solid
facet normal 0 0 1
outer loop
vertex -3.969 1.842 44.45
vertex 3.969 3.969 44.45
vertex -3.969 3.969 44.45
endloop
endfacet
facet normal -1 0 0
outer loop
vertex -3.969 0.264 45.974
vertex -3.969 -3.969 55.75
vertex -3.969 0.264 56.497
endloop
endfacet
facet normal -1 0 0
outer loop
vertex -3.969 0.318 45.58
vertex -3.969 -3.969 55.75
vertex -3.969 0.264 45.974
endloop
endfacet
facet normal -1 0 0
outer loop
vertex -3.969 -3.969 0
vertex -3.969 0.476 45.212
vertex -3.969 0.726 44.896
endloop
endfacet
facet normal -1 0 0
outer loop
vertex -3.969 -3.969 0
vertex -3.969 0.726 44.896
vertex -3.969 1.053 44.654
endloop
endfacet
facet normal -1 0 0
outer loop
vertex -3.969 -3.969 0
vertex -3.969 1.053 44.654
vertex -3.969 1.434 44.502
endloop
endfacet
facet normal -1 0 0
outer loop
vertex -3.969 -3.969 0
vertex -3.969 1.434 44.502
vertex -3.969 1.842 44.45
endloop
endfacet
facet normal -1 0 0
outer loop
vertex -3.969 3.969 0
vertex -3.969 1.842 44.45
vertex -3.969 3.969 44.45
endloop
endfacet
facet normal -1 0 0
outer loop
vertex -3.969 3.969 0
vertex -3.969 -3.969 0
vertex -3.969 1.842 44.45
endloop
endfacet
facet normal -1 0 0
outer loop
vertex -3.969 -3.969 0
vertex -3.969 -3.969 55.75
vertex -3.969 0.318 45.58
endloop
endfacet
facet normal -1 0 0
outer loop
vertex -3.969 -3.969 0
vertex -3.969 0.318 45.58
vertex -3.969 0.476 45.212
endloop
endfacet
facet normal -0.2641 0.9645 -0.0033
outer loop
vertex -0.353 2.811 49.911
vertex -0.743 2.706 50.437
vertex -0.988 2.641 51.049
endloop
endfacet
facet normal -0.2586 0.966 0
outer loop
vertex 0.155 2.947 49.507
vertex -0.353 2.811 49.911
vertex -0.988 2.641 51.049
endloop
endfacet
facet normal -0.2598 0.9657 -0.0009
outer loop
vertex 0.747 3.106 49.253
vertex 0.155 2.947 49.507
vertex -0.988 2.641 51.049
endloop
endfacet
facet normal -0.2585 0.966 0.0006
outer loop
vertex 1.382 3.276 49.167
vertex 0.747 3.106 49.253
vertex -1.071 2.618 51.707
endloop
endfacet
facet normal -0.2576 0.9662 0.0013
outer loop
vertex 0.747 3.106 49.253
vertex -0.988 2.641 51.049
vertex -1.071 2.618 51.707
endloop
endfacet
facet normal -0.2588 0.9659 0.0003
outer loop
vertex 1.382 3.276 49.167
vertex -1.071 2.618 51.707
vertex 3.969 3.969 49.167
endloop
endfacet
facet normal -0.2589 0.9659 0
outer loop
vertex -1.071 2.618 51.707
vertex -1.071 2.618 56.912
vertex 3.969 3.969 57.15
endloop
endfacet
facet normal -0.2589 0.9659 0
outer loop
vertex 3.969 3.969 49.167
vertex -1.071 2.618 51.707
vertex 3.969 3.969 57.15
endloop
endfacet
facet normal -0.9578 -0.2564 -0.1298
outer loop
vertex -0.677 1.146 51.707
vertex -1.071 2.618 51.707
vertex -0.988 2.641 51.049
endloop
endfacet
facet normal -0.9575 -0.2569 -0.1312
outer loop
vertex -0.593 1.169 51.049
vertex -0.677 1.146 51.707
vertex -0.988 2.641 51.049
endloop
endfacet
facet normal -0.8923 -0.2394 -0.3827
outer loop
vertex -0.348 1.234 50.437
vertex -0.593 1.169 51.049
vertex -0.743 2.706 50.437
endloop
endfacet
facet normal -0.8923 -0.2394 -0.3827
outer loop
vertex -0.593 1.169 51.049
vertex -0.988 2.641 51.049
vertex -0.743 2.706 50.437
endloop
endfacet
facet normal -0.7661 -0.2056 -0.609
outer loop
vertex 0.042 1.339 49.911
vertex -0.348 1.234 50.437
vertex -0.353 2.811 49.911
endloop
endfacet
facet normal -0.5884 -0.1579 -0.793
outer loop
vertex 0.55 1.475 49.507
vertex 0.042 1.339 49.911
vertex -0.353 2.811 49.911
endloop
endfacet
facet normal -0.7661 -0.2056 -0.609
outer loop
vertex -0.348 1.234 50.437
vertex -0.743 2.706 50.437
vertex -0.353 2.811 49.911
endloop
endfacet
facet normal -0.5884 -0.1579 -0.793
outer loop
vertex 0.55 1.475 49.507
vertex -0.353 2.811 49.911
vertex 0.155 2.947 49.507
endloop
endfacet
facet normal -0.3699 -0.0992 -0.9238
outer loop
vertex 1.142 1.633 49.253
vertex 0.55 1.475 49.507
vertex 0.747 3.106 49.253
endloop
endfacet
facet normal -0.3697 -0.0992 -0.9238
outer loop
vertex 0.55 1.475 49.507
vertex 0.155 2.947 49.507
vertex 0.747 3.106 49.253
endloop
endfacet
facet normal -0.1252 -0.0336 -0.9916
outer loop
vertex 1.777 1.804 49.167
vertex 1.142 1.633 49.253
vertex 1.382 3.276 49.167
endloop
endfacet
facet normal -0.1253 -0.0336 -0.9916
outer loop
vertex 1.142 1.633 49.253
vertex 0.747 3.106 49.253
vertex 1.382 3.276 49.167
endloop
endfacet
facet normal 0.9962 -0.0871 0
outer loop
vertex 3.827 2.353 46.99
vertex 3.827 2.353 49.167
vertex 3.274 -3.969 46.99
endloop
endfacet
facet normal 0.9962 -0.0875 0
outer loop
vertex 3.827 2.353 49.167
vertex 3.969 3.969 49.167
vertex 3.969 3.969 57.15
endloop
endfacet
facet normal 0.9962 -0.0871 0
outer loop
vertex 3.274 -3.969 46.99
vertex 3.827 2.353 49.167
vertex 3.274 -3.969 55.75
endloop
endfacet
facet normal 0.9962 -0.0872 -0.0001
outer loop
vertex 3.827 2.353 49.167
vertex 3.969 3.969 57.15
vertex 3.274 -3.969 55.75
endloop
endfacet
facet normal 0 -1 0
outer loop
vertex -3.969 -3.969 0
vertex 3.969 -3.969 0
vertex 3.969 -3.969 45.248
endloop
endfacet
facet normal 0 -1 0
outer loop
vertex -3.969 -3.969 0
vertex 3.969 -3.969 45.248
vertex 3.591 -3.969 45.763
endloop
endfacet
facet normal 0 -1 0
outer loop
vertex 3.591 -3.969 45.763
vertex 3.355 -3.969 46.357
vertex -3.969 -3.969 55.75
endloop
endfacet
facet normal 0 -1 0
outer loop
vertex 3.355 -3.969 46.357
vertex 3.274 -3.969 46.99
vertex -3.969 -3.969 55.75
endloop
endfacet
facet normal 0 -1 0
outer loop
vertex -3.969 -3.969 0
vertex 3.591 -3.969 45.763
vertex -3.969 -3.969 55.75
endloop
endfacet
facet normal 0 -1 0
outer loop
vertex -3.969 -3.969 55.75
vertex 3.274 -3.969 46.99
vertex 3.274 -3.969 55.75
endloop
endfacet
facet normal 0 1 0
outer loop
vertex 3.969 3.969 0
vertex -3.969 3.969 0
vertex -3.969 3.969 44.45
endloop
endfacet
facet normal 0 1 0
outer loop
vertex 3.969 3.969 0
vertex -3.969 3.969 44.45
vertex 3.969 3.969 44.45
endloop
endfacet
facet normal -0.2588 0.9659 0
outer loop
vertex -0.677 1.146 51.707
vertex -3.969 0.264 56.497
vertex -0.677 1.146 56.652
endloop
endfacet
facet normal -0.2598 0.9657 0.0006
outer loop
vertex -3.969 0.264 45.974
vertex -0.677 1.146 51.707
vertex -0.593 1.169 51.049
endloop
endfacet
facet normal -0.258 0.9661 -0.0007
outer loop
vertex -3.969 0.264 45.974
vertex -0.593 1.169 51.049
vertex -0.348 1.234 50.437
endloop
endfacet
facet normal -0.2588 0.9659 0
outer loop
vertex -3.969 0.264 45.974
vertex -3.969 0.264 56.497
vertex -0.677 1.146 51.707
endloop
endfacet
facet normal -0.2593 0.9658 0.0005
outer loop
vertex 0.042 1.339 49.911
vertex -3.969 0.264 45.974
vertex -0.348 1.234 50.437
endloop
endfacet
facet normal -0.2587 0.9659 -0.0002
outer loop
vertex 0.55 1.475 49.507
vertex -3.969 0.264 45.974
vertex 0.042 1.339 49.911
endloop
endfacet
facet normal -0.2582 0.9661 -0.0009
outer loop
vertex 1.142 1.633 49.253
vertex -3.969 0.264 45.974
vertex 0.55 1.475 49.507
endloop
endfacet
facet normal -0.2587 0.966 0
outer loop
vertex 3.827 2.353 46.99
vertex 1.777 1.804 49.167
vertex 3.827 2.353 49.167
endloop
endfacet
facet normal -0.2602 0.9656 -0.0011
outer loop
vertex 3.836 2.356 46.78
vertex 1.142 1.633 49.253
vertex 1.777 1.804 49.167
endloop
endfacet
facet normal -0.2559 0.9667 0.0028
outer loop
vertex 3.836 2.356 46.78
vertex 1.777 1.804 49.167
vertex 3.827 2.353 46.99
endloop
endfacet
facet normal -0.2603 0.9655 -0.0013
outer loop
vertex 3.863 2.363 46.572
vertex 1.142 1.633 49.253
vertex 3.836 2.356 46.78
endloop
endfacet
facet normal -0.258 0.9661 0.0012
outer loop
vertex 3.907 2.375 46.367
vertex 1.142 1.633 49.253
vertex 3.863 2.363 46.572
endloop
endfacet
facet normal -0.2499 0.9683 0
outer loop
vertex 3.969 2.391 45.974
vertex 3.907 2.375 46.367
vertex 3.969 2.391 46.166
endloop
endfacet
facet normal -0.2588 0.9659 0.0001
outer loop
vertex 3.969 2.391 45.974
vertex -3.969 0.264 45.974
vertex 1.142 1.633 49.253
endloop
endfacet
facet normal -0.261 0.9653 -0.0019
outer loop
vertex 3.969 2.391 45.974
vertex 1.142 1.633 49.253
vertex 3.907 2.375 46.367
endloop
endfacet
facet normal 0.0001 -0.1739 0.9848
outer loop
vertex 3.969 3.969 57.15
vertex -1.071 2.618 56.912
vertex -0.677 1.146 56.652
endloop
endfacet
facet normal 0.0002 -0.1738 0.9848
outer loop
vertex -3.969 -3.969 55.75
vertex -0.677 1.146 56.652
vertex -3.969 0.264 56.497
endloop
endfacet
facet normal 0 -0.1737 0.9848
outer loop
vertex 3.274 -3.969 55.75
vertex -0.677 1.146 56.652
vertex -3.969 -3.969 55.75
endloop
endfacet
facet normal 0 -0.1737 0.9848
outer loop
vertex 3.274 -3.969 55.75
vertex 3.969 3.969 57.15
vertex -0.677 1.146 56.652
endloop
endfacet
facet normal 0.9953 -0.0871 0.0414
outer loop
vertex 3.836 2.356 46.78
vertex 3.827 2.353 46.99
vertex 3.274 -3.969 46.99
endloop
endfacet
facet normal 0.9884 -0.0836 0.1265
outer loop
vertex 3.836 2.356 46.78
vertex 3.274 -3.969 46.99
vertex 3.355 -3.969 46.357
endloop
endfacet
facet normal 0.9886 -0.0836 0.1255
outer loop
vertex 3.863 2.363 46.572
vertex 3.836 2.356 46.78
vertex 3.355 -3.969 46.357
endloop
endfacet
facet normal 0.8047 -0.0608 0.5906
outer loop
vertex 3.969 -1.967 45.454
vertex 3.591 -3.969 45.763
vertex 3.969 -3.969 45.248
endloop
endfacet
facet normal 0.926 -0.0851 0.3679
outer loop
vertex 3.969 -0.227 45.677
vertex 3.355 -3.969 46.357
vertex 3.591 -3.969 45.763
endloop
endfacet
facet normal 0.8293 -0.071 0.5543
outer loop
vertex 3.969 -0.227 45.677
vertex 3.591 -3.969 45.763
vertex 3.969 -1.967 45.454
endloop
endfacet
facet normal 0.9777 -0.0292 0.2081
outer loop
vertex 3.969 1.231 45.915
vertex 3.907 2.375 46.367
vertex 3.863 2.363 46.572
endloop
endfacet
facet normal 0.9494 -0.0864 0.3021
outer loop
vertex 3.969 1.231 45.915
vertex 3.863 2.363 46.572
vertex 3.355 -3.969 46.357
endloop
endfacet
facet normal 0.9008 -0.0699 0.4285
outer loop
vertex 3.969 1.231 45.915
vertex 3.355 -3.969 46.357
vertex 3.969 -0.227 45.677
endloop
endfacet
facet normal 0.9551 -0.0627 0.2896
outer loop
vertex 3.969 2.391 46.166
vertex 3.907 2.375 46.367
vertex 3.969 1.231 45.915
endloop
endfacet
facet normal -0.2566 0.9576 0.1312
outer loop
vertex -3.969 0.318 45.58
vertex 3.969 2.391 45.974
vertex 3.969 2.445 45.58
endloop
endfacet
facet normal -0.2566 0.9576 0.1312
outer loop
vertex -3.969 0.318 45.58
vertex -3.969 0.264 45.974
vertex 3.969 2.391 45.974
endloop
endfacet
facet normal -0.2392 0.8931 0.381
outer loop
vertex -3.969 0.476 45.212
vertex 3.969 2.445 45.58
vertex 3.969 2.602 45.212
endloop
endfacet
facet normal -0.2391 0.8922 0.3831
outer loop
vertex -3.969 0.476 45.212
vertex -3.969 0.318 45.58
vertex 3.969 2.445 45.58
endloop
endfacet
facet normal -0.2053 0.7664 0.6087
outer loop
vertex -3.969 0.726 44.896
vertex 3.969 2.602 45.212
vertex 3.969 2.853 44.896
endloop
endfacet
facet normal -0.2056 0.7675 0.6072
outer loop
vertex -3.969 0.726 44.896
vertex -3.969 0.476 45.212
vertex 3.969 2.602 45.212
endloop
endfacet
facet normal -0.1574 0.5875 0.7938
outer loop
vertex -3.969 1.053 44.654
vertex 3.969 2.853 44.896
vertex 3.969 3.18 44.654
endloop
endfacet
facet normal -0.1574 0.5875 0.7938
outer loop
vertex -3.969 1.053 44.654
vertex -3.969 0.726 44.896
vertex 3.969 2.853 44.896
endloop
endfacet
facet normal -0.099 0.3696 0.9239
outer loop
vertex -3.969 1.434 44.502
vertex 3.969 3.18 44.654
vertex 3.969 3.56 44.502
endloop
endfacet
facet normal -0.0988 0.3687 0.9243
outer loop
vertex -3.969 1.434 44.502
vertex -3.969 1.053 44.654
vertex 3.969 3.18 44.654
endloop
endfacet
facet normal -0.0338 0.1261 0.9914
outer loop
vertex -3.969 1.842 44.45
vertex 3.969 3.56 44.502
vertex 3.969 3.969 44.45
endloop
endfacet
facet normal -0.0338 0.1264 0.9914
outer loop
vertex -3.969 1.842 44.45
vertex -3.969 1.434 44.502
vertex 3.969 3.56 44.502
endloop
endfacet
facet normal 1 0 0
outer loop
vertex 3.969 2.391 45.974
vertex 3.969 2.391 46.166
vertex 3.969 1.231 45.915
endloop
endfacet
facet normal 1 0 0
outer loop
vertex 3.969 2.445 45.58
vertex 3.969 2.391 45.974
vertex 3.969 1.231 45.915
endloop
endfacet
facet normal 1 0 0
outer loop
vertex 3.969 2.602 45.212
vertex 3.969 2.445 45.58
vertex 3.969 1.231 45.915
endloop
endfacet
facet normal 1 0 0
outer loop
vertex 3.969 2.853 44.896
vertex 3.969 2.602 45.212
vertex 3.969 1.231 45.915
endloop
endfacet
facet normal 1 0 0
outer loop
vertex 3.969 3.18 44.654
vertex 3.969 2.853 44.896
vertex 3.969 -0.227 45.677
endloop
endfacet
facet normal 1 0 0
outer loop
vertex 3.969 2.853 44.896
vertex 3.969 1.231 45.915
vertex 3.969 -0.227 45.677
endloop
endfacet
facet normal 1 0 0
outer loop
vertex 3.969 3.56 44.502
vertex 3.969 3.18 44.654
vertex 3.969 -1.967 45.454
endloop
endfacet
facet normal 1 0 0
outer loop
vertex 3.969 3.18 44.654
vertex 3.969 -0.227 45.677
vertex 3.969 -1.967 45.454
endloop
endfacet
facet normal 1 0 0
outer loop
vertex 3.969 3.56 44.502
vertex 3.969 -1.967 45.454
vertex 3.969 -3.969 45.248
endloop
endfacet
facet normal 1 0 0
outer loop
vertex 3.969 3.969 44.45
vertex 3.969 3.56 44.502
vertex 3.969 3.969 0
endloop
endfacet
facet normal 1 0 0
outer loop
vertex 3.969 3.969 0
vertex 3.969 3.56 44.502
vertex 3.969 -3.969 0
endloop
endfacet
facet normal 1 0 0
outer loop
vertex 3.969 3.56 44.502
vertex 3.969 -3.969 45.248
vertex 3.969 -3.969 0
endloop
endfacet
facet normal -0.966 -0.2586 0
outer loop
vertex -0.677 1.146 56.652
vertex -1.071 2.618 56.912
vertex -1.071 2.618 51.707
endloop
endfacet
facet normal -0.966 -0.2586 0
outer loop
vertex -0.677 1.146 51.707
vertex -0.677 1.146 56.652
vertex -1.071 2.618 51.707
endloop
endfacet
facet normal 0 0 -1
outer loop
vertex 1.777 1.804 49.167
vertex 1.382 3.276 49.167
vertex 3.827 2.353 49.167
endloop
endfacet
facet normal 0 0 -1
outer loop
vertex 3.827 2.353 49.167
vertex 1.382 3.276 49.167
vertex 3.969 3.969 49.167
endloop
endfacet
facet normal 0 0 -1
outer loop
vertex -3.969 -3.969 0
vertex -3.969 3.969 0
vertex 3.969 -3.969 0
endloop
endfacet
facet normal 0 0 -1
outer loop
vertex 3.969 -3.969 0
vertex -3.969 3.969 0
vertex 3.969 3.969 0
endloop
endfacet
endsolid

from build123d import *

# Parameters (mm, degrees)
SKETCH1_W           = 7.9375
SKETCH1_H           = 7.9375
BOSS_EXTRUDE1_DEPTH = 57.15
SKETCH2_OUTSIDE_W   = 21.586
SKETCH2_OUTSIDE_H   = 21.586
CUT_EXTRUDE1_DEPTH  = 12.7
FILLET2_R           = 2.54
CUT_EXTRUDE2_DEPTH  = 58.834914911
CUT_EXTRUDE3_DEPTH  = 1.524
FILLET3_R           = 1.524


with BuildPart() as part:
    # Sketch1 → Boss-Extrude1 (new body)
    with BuildSketch(Plane.XY):
        Rectangle(SKETCH1_W, SKETCH1_H)
    extrude(amount=BOSS_EXTRUDE1_DEPTH)

    # Sketch2 outside → Cut-Extrude1 (cut)
    with BuildSketch(Plane.XY.offset(57.15)):
        Rectangle(SKETCH2_OUTSIDE_W, SKETCH2_OUTSIDE_H)
        Polygon((-3.96875, 1.841903285), (3.96875, 3.96875), (3.274308733, -3.96875), (-3.96875, -3.96875), align=None, mode=Mode.SUBTRACT)
    extrude(amount=-CUT_EXTRUDE1_DEPTH, mode=Mode.SUBTRACT)

    # Fillet2
    # the kernel refuses this fillet: 2.54 mm, written as the material it adds along each edge
    with BuildSketch(Plane(origin=(4.522188966, 10.294586333, 44.45), x_dir=(0.9961946980917462, -0.08715574274765137, 0), z_dir=(-0.08715574274765137, -0.9961946980917462, 0))) as fillet2_piece_1_section:
        with BuildLine():
            CenterArc((FILLET2_R, FILLET2_R), FILLET2_R, 180, 90)
            Line((0, FILLET2_R), (0, 0))
            Line((0, 0), (FILLET2_R, 0))
        make_face()
    fillet2_piece_1 = extrude(amount=20.667819961, mode=Mode.PRIVATE)
    fillet2_piece_1 = split(fillet2_piece_1, bisect_by=Plane(origin=(3.717682753, -3.96875, 45.282950751), z_dir=(0, 1, 0)), keep=Keep.TOP, mode=Mode.PRIVATE)
    fillet2_piece_1 = split(fillet2_piece_1, bisect_by=Plane(origin=(3.96875, -1.099038231, 45.282950751), z_dir=(-1, 0, 0)), keep=Keep.TOP, mode=Mode.PRIVATE)
    add(fillet2_piece_1)

    # Sketch3 → Cut-Extrude2 (cut, through all)
    with BuildSketch(Plane(origin=(3.96875, 0, 0), x_dir=(0, 0, -1), z_dir=(1, 0, 0))):
        Polygon((-57.15, 3.96875), (-55.750404591, -3.96875), (-57.15, -3.96875), align=None)
    extrude(amount=-CUT_EXTRUDE2_DEPTH, mode=Mode.SUBTRACT)

    # Sketch4 → Cut-Extrude3 (cut)
    with BuildSketch(Plane(origin=(-0.726331661, 2.710706661, 0), x_dir=(0.96592582628907, 0.2588190451025147, 0), z_dir=(-0.25881904510251463, 0.9659258262890699, 0))):
        Polygon((-3.356798474, -44.45), (-5.976622114, -44.45), (-5.976622114, -56.911870861), (-0.35721527, -56.911870861), (-3.356798474, -56.77497954), align=None)
        with BuildLine():
            Line((4.860706208, -44.45), (-3.356798474, -44.45))
            Line((-3.356798474, -44.45), (-3.356798474, -56.77497954))
            Line((-3.356798474, -56.77497954), (-0.35721527, -56.911870861))
            Line((-0.35721527, -56.911870861), (-0.35721527, -51.706707489))
            ThreePointArc((-0.35721527, -51.706707489), (0.386733506, -49.910656265), (2.18278473, -49.166707489))
            Line((2.18278473, -49.166707489), (4.860706208, -49.166707489))
            Line((4.860706208, -49.166707489), (4.860706208, -46.989995764))
            Line((4.860706208, -46.989995764), (4.860706208, -44.45))
        make_face()
        Polygon((8.895382264, -44.45), (4.860706208, -44.45), (4.860706208, -46.989995764), (4.860706208, -49.166707489), (4.860706208, -57.15), (8.895382264, -57.15), align=None)
    extrude(amount=-CUT_EXTRUDE3_DEPTH, mode=Mode.SUBTRACT)

    # Fillet3
    fillet3_edges = [part.edges().sort_by_distance(p)[0] for p in [
        (0, 1.327565744, 44.45),
    ]]
    fillet(fillet3_edges, radius=FILLET3_R)


solid = part.part
